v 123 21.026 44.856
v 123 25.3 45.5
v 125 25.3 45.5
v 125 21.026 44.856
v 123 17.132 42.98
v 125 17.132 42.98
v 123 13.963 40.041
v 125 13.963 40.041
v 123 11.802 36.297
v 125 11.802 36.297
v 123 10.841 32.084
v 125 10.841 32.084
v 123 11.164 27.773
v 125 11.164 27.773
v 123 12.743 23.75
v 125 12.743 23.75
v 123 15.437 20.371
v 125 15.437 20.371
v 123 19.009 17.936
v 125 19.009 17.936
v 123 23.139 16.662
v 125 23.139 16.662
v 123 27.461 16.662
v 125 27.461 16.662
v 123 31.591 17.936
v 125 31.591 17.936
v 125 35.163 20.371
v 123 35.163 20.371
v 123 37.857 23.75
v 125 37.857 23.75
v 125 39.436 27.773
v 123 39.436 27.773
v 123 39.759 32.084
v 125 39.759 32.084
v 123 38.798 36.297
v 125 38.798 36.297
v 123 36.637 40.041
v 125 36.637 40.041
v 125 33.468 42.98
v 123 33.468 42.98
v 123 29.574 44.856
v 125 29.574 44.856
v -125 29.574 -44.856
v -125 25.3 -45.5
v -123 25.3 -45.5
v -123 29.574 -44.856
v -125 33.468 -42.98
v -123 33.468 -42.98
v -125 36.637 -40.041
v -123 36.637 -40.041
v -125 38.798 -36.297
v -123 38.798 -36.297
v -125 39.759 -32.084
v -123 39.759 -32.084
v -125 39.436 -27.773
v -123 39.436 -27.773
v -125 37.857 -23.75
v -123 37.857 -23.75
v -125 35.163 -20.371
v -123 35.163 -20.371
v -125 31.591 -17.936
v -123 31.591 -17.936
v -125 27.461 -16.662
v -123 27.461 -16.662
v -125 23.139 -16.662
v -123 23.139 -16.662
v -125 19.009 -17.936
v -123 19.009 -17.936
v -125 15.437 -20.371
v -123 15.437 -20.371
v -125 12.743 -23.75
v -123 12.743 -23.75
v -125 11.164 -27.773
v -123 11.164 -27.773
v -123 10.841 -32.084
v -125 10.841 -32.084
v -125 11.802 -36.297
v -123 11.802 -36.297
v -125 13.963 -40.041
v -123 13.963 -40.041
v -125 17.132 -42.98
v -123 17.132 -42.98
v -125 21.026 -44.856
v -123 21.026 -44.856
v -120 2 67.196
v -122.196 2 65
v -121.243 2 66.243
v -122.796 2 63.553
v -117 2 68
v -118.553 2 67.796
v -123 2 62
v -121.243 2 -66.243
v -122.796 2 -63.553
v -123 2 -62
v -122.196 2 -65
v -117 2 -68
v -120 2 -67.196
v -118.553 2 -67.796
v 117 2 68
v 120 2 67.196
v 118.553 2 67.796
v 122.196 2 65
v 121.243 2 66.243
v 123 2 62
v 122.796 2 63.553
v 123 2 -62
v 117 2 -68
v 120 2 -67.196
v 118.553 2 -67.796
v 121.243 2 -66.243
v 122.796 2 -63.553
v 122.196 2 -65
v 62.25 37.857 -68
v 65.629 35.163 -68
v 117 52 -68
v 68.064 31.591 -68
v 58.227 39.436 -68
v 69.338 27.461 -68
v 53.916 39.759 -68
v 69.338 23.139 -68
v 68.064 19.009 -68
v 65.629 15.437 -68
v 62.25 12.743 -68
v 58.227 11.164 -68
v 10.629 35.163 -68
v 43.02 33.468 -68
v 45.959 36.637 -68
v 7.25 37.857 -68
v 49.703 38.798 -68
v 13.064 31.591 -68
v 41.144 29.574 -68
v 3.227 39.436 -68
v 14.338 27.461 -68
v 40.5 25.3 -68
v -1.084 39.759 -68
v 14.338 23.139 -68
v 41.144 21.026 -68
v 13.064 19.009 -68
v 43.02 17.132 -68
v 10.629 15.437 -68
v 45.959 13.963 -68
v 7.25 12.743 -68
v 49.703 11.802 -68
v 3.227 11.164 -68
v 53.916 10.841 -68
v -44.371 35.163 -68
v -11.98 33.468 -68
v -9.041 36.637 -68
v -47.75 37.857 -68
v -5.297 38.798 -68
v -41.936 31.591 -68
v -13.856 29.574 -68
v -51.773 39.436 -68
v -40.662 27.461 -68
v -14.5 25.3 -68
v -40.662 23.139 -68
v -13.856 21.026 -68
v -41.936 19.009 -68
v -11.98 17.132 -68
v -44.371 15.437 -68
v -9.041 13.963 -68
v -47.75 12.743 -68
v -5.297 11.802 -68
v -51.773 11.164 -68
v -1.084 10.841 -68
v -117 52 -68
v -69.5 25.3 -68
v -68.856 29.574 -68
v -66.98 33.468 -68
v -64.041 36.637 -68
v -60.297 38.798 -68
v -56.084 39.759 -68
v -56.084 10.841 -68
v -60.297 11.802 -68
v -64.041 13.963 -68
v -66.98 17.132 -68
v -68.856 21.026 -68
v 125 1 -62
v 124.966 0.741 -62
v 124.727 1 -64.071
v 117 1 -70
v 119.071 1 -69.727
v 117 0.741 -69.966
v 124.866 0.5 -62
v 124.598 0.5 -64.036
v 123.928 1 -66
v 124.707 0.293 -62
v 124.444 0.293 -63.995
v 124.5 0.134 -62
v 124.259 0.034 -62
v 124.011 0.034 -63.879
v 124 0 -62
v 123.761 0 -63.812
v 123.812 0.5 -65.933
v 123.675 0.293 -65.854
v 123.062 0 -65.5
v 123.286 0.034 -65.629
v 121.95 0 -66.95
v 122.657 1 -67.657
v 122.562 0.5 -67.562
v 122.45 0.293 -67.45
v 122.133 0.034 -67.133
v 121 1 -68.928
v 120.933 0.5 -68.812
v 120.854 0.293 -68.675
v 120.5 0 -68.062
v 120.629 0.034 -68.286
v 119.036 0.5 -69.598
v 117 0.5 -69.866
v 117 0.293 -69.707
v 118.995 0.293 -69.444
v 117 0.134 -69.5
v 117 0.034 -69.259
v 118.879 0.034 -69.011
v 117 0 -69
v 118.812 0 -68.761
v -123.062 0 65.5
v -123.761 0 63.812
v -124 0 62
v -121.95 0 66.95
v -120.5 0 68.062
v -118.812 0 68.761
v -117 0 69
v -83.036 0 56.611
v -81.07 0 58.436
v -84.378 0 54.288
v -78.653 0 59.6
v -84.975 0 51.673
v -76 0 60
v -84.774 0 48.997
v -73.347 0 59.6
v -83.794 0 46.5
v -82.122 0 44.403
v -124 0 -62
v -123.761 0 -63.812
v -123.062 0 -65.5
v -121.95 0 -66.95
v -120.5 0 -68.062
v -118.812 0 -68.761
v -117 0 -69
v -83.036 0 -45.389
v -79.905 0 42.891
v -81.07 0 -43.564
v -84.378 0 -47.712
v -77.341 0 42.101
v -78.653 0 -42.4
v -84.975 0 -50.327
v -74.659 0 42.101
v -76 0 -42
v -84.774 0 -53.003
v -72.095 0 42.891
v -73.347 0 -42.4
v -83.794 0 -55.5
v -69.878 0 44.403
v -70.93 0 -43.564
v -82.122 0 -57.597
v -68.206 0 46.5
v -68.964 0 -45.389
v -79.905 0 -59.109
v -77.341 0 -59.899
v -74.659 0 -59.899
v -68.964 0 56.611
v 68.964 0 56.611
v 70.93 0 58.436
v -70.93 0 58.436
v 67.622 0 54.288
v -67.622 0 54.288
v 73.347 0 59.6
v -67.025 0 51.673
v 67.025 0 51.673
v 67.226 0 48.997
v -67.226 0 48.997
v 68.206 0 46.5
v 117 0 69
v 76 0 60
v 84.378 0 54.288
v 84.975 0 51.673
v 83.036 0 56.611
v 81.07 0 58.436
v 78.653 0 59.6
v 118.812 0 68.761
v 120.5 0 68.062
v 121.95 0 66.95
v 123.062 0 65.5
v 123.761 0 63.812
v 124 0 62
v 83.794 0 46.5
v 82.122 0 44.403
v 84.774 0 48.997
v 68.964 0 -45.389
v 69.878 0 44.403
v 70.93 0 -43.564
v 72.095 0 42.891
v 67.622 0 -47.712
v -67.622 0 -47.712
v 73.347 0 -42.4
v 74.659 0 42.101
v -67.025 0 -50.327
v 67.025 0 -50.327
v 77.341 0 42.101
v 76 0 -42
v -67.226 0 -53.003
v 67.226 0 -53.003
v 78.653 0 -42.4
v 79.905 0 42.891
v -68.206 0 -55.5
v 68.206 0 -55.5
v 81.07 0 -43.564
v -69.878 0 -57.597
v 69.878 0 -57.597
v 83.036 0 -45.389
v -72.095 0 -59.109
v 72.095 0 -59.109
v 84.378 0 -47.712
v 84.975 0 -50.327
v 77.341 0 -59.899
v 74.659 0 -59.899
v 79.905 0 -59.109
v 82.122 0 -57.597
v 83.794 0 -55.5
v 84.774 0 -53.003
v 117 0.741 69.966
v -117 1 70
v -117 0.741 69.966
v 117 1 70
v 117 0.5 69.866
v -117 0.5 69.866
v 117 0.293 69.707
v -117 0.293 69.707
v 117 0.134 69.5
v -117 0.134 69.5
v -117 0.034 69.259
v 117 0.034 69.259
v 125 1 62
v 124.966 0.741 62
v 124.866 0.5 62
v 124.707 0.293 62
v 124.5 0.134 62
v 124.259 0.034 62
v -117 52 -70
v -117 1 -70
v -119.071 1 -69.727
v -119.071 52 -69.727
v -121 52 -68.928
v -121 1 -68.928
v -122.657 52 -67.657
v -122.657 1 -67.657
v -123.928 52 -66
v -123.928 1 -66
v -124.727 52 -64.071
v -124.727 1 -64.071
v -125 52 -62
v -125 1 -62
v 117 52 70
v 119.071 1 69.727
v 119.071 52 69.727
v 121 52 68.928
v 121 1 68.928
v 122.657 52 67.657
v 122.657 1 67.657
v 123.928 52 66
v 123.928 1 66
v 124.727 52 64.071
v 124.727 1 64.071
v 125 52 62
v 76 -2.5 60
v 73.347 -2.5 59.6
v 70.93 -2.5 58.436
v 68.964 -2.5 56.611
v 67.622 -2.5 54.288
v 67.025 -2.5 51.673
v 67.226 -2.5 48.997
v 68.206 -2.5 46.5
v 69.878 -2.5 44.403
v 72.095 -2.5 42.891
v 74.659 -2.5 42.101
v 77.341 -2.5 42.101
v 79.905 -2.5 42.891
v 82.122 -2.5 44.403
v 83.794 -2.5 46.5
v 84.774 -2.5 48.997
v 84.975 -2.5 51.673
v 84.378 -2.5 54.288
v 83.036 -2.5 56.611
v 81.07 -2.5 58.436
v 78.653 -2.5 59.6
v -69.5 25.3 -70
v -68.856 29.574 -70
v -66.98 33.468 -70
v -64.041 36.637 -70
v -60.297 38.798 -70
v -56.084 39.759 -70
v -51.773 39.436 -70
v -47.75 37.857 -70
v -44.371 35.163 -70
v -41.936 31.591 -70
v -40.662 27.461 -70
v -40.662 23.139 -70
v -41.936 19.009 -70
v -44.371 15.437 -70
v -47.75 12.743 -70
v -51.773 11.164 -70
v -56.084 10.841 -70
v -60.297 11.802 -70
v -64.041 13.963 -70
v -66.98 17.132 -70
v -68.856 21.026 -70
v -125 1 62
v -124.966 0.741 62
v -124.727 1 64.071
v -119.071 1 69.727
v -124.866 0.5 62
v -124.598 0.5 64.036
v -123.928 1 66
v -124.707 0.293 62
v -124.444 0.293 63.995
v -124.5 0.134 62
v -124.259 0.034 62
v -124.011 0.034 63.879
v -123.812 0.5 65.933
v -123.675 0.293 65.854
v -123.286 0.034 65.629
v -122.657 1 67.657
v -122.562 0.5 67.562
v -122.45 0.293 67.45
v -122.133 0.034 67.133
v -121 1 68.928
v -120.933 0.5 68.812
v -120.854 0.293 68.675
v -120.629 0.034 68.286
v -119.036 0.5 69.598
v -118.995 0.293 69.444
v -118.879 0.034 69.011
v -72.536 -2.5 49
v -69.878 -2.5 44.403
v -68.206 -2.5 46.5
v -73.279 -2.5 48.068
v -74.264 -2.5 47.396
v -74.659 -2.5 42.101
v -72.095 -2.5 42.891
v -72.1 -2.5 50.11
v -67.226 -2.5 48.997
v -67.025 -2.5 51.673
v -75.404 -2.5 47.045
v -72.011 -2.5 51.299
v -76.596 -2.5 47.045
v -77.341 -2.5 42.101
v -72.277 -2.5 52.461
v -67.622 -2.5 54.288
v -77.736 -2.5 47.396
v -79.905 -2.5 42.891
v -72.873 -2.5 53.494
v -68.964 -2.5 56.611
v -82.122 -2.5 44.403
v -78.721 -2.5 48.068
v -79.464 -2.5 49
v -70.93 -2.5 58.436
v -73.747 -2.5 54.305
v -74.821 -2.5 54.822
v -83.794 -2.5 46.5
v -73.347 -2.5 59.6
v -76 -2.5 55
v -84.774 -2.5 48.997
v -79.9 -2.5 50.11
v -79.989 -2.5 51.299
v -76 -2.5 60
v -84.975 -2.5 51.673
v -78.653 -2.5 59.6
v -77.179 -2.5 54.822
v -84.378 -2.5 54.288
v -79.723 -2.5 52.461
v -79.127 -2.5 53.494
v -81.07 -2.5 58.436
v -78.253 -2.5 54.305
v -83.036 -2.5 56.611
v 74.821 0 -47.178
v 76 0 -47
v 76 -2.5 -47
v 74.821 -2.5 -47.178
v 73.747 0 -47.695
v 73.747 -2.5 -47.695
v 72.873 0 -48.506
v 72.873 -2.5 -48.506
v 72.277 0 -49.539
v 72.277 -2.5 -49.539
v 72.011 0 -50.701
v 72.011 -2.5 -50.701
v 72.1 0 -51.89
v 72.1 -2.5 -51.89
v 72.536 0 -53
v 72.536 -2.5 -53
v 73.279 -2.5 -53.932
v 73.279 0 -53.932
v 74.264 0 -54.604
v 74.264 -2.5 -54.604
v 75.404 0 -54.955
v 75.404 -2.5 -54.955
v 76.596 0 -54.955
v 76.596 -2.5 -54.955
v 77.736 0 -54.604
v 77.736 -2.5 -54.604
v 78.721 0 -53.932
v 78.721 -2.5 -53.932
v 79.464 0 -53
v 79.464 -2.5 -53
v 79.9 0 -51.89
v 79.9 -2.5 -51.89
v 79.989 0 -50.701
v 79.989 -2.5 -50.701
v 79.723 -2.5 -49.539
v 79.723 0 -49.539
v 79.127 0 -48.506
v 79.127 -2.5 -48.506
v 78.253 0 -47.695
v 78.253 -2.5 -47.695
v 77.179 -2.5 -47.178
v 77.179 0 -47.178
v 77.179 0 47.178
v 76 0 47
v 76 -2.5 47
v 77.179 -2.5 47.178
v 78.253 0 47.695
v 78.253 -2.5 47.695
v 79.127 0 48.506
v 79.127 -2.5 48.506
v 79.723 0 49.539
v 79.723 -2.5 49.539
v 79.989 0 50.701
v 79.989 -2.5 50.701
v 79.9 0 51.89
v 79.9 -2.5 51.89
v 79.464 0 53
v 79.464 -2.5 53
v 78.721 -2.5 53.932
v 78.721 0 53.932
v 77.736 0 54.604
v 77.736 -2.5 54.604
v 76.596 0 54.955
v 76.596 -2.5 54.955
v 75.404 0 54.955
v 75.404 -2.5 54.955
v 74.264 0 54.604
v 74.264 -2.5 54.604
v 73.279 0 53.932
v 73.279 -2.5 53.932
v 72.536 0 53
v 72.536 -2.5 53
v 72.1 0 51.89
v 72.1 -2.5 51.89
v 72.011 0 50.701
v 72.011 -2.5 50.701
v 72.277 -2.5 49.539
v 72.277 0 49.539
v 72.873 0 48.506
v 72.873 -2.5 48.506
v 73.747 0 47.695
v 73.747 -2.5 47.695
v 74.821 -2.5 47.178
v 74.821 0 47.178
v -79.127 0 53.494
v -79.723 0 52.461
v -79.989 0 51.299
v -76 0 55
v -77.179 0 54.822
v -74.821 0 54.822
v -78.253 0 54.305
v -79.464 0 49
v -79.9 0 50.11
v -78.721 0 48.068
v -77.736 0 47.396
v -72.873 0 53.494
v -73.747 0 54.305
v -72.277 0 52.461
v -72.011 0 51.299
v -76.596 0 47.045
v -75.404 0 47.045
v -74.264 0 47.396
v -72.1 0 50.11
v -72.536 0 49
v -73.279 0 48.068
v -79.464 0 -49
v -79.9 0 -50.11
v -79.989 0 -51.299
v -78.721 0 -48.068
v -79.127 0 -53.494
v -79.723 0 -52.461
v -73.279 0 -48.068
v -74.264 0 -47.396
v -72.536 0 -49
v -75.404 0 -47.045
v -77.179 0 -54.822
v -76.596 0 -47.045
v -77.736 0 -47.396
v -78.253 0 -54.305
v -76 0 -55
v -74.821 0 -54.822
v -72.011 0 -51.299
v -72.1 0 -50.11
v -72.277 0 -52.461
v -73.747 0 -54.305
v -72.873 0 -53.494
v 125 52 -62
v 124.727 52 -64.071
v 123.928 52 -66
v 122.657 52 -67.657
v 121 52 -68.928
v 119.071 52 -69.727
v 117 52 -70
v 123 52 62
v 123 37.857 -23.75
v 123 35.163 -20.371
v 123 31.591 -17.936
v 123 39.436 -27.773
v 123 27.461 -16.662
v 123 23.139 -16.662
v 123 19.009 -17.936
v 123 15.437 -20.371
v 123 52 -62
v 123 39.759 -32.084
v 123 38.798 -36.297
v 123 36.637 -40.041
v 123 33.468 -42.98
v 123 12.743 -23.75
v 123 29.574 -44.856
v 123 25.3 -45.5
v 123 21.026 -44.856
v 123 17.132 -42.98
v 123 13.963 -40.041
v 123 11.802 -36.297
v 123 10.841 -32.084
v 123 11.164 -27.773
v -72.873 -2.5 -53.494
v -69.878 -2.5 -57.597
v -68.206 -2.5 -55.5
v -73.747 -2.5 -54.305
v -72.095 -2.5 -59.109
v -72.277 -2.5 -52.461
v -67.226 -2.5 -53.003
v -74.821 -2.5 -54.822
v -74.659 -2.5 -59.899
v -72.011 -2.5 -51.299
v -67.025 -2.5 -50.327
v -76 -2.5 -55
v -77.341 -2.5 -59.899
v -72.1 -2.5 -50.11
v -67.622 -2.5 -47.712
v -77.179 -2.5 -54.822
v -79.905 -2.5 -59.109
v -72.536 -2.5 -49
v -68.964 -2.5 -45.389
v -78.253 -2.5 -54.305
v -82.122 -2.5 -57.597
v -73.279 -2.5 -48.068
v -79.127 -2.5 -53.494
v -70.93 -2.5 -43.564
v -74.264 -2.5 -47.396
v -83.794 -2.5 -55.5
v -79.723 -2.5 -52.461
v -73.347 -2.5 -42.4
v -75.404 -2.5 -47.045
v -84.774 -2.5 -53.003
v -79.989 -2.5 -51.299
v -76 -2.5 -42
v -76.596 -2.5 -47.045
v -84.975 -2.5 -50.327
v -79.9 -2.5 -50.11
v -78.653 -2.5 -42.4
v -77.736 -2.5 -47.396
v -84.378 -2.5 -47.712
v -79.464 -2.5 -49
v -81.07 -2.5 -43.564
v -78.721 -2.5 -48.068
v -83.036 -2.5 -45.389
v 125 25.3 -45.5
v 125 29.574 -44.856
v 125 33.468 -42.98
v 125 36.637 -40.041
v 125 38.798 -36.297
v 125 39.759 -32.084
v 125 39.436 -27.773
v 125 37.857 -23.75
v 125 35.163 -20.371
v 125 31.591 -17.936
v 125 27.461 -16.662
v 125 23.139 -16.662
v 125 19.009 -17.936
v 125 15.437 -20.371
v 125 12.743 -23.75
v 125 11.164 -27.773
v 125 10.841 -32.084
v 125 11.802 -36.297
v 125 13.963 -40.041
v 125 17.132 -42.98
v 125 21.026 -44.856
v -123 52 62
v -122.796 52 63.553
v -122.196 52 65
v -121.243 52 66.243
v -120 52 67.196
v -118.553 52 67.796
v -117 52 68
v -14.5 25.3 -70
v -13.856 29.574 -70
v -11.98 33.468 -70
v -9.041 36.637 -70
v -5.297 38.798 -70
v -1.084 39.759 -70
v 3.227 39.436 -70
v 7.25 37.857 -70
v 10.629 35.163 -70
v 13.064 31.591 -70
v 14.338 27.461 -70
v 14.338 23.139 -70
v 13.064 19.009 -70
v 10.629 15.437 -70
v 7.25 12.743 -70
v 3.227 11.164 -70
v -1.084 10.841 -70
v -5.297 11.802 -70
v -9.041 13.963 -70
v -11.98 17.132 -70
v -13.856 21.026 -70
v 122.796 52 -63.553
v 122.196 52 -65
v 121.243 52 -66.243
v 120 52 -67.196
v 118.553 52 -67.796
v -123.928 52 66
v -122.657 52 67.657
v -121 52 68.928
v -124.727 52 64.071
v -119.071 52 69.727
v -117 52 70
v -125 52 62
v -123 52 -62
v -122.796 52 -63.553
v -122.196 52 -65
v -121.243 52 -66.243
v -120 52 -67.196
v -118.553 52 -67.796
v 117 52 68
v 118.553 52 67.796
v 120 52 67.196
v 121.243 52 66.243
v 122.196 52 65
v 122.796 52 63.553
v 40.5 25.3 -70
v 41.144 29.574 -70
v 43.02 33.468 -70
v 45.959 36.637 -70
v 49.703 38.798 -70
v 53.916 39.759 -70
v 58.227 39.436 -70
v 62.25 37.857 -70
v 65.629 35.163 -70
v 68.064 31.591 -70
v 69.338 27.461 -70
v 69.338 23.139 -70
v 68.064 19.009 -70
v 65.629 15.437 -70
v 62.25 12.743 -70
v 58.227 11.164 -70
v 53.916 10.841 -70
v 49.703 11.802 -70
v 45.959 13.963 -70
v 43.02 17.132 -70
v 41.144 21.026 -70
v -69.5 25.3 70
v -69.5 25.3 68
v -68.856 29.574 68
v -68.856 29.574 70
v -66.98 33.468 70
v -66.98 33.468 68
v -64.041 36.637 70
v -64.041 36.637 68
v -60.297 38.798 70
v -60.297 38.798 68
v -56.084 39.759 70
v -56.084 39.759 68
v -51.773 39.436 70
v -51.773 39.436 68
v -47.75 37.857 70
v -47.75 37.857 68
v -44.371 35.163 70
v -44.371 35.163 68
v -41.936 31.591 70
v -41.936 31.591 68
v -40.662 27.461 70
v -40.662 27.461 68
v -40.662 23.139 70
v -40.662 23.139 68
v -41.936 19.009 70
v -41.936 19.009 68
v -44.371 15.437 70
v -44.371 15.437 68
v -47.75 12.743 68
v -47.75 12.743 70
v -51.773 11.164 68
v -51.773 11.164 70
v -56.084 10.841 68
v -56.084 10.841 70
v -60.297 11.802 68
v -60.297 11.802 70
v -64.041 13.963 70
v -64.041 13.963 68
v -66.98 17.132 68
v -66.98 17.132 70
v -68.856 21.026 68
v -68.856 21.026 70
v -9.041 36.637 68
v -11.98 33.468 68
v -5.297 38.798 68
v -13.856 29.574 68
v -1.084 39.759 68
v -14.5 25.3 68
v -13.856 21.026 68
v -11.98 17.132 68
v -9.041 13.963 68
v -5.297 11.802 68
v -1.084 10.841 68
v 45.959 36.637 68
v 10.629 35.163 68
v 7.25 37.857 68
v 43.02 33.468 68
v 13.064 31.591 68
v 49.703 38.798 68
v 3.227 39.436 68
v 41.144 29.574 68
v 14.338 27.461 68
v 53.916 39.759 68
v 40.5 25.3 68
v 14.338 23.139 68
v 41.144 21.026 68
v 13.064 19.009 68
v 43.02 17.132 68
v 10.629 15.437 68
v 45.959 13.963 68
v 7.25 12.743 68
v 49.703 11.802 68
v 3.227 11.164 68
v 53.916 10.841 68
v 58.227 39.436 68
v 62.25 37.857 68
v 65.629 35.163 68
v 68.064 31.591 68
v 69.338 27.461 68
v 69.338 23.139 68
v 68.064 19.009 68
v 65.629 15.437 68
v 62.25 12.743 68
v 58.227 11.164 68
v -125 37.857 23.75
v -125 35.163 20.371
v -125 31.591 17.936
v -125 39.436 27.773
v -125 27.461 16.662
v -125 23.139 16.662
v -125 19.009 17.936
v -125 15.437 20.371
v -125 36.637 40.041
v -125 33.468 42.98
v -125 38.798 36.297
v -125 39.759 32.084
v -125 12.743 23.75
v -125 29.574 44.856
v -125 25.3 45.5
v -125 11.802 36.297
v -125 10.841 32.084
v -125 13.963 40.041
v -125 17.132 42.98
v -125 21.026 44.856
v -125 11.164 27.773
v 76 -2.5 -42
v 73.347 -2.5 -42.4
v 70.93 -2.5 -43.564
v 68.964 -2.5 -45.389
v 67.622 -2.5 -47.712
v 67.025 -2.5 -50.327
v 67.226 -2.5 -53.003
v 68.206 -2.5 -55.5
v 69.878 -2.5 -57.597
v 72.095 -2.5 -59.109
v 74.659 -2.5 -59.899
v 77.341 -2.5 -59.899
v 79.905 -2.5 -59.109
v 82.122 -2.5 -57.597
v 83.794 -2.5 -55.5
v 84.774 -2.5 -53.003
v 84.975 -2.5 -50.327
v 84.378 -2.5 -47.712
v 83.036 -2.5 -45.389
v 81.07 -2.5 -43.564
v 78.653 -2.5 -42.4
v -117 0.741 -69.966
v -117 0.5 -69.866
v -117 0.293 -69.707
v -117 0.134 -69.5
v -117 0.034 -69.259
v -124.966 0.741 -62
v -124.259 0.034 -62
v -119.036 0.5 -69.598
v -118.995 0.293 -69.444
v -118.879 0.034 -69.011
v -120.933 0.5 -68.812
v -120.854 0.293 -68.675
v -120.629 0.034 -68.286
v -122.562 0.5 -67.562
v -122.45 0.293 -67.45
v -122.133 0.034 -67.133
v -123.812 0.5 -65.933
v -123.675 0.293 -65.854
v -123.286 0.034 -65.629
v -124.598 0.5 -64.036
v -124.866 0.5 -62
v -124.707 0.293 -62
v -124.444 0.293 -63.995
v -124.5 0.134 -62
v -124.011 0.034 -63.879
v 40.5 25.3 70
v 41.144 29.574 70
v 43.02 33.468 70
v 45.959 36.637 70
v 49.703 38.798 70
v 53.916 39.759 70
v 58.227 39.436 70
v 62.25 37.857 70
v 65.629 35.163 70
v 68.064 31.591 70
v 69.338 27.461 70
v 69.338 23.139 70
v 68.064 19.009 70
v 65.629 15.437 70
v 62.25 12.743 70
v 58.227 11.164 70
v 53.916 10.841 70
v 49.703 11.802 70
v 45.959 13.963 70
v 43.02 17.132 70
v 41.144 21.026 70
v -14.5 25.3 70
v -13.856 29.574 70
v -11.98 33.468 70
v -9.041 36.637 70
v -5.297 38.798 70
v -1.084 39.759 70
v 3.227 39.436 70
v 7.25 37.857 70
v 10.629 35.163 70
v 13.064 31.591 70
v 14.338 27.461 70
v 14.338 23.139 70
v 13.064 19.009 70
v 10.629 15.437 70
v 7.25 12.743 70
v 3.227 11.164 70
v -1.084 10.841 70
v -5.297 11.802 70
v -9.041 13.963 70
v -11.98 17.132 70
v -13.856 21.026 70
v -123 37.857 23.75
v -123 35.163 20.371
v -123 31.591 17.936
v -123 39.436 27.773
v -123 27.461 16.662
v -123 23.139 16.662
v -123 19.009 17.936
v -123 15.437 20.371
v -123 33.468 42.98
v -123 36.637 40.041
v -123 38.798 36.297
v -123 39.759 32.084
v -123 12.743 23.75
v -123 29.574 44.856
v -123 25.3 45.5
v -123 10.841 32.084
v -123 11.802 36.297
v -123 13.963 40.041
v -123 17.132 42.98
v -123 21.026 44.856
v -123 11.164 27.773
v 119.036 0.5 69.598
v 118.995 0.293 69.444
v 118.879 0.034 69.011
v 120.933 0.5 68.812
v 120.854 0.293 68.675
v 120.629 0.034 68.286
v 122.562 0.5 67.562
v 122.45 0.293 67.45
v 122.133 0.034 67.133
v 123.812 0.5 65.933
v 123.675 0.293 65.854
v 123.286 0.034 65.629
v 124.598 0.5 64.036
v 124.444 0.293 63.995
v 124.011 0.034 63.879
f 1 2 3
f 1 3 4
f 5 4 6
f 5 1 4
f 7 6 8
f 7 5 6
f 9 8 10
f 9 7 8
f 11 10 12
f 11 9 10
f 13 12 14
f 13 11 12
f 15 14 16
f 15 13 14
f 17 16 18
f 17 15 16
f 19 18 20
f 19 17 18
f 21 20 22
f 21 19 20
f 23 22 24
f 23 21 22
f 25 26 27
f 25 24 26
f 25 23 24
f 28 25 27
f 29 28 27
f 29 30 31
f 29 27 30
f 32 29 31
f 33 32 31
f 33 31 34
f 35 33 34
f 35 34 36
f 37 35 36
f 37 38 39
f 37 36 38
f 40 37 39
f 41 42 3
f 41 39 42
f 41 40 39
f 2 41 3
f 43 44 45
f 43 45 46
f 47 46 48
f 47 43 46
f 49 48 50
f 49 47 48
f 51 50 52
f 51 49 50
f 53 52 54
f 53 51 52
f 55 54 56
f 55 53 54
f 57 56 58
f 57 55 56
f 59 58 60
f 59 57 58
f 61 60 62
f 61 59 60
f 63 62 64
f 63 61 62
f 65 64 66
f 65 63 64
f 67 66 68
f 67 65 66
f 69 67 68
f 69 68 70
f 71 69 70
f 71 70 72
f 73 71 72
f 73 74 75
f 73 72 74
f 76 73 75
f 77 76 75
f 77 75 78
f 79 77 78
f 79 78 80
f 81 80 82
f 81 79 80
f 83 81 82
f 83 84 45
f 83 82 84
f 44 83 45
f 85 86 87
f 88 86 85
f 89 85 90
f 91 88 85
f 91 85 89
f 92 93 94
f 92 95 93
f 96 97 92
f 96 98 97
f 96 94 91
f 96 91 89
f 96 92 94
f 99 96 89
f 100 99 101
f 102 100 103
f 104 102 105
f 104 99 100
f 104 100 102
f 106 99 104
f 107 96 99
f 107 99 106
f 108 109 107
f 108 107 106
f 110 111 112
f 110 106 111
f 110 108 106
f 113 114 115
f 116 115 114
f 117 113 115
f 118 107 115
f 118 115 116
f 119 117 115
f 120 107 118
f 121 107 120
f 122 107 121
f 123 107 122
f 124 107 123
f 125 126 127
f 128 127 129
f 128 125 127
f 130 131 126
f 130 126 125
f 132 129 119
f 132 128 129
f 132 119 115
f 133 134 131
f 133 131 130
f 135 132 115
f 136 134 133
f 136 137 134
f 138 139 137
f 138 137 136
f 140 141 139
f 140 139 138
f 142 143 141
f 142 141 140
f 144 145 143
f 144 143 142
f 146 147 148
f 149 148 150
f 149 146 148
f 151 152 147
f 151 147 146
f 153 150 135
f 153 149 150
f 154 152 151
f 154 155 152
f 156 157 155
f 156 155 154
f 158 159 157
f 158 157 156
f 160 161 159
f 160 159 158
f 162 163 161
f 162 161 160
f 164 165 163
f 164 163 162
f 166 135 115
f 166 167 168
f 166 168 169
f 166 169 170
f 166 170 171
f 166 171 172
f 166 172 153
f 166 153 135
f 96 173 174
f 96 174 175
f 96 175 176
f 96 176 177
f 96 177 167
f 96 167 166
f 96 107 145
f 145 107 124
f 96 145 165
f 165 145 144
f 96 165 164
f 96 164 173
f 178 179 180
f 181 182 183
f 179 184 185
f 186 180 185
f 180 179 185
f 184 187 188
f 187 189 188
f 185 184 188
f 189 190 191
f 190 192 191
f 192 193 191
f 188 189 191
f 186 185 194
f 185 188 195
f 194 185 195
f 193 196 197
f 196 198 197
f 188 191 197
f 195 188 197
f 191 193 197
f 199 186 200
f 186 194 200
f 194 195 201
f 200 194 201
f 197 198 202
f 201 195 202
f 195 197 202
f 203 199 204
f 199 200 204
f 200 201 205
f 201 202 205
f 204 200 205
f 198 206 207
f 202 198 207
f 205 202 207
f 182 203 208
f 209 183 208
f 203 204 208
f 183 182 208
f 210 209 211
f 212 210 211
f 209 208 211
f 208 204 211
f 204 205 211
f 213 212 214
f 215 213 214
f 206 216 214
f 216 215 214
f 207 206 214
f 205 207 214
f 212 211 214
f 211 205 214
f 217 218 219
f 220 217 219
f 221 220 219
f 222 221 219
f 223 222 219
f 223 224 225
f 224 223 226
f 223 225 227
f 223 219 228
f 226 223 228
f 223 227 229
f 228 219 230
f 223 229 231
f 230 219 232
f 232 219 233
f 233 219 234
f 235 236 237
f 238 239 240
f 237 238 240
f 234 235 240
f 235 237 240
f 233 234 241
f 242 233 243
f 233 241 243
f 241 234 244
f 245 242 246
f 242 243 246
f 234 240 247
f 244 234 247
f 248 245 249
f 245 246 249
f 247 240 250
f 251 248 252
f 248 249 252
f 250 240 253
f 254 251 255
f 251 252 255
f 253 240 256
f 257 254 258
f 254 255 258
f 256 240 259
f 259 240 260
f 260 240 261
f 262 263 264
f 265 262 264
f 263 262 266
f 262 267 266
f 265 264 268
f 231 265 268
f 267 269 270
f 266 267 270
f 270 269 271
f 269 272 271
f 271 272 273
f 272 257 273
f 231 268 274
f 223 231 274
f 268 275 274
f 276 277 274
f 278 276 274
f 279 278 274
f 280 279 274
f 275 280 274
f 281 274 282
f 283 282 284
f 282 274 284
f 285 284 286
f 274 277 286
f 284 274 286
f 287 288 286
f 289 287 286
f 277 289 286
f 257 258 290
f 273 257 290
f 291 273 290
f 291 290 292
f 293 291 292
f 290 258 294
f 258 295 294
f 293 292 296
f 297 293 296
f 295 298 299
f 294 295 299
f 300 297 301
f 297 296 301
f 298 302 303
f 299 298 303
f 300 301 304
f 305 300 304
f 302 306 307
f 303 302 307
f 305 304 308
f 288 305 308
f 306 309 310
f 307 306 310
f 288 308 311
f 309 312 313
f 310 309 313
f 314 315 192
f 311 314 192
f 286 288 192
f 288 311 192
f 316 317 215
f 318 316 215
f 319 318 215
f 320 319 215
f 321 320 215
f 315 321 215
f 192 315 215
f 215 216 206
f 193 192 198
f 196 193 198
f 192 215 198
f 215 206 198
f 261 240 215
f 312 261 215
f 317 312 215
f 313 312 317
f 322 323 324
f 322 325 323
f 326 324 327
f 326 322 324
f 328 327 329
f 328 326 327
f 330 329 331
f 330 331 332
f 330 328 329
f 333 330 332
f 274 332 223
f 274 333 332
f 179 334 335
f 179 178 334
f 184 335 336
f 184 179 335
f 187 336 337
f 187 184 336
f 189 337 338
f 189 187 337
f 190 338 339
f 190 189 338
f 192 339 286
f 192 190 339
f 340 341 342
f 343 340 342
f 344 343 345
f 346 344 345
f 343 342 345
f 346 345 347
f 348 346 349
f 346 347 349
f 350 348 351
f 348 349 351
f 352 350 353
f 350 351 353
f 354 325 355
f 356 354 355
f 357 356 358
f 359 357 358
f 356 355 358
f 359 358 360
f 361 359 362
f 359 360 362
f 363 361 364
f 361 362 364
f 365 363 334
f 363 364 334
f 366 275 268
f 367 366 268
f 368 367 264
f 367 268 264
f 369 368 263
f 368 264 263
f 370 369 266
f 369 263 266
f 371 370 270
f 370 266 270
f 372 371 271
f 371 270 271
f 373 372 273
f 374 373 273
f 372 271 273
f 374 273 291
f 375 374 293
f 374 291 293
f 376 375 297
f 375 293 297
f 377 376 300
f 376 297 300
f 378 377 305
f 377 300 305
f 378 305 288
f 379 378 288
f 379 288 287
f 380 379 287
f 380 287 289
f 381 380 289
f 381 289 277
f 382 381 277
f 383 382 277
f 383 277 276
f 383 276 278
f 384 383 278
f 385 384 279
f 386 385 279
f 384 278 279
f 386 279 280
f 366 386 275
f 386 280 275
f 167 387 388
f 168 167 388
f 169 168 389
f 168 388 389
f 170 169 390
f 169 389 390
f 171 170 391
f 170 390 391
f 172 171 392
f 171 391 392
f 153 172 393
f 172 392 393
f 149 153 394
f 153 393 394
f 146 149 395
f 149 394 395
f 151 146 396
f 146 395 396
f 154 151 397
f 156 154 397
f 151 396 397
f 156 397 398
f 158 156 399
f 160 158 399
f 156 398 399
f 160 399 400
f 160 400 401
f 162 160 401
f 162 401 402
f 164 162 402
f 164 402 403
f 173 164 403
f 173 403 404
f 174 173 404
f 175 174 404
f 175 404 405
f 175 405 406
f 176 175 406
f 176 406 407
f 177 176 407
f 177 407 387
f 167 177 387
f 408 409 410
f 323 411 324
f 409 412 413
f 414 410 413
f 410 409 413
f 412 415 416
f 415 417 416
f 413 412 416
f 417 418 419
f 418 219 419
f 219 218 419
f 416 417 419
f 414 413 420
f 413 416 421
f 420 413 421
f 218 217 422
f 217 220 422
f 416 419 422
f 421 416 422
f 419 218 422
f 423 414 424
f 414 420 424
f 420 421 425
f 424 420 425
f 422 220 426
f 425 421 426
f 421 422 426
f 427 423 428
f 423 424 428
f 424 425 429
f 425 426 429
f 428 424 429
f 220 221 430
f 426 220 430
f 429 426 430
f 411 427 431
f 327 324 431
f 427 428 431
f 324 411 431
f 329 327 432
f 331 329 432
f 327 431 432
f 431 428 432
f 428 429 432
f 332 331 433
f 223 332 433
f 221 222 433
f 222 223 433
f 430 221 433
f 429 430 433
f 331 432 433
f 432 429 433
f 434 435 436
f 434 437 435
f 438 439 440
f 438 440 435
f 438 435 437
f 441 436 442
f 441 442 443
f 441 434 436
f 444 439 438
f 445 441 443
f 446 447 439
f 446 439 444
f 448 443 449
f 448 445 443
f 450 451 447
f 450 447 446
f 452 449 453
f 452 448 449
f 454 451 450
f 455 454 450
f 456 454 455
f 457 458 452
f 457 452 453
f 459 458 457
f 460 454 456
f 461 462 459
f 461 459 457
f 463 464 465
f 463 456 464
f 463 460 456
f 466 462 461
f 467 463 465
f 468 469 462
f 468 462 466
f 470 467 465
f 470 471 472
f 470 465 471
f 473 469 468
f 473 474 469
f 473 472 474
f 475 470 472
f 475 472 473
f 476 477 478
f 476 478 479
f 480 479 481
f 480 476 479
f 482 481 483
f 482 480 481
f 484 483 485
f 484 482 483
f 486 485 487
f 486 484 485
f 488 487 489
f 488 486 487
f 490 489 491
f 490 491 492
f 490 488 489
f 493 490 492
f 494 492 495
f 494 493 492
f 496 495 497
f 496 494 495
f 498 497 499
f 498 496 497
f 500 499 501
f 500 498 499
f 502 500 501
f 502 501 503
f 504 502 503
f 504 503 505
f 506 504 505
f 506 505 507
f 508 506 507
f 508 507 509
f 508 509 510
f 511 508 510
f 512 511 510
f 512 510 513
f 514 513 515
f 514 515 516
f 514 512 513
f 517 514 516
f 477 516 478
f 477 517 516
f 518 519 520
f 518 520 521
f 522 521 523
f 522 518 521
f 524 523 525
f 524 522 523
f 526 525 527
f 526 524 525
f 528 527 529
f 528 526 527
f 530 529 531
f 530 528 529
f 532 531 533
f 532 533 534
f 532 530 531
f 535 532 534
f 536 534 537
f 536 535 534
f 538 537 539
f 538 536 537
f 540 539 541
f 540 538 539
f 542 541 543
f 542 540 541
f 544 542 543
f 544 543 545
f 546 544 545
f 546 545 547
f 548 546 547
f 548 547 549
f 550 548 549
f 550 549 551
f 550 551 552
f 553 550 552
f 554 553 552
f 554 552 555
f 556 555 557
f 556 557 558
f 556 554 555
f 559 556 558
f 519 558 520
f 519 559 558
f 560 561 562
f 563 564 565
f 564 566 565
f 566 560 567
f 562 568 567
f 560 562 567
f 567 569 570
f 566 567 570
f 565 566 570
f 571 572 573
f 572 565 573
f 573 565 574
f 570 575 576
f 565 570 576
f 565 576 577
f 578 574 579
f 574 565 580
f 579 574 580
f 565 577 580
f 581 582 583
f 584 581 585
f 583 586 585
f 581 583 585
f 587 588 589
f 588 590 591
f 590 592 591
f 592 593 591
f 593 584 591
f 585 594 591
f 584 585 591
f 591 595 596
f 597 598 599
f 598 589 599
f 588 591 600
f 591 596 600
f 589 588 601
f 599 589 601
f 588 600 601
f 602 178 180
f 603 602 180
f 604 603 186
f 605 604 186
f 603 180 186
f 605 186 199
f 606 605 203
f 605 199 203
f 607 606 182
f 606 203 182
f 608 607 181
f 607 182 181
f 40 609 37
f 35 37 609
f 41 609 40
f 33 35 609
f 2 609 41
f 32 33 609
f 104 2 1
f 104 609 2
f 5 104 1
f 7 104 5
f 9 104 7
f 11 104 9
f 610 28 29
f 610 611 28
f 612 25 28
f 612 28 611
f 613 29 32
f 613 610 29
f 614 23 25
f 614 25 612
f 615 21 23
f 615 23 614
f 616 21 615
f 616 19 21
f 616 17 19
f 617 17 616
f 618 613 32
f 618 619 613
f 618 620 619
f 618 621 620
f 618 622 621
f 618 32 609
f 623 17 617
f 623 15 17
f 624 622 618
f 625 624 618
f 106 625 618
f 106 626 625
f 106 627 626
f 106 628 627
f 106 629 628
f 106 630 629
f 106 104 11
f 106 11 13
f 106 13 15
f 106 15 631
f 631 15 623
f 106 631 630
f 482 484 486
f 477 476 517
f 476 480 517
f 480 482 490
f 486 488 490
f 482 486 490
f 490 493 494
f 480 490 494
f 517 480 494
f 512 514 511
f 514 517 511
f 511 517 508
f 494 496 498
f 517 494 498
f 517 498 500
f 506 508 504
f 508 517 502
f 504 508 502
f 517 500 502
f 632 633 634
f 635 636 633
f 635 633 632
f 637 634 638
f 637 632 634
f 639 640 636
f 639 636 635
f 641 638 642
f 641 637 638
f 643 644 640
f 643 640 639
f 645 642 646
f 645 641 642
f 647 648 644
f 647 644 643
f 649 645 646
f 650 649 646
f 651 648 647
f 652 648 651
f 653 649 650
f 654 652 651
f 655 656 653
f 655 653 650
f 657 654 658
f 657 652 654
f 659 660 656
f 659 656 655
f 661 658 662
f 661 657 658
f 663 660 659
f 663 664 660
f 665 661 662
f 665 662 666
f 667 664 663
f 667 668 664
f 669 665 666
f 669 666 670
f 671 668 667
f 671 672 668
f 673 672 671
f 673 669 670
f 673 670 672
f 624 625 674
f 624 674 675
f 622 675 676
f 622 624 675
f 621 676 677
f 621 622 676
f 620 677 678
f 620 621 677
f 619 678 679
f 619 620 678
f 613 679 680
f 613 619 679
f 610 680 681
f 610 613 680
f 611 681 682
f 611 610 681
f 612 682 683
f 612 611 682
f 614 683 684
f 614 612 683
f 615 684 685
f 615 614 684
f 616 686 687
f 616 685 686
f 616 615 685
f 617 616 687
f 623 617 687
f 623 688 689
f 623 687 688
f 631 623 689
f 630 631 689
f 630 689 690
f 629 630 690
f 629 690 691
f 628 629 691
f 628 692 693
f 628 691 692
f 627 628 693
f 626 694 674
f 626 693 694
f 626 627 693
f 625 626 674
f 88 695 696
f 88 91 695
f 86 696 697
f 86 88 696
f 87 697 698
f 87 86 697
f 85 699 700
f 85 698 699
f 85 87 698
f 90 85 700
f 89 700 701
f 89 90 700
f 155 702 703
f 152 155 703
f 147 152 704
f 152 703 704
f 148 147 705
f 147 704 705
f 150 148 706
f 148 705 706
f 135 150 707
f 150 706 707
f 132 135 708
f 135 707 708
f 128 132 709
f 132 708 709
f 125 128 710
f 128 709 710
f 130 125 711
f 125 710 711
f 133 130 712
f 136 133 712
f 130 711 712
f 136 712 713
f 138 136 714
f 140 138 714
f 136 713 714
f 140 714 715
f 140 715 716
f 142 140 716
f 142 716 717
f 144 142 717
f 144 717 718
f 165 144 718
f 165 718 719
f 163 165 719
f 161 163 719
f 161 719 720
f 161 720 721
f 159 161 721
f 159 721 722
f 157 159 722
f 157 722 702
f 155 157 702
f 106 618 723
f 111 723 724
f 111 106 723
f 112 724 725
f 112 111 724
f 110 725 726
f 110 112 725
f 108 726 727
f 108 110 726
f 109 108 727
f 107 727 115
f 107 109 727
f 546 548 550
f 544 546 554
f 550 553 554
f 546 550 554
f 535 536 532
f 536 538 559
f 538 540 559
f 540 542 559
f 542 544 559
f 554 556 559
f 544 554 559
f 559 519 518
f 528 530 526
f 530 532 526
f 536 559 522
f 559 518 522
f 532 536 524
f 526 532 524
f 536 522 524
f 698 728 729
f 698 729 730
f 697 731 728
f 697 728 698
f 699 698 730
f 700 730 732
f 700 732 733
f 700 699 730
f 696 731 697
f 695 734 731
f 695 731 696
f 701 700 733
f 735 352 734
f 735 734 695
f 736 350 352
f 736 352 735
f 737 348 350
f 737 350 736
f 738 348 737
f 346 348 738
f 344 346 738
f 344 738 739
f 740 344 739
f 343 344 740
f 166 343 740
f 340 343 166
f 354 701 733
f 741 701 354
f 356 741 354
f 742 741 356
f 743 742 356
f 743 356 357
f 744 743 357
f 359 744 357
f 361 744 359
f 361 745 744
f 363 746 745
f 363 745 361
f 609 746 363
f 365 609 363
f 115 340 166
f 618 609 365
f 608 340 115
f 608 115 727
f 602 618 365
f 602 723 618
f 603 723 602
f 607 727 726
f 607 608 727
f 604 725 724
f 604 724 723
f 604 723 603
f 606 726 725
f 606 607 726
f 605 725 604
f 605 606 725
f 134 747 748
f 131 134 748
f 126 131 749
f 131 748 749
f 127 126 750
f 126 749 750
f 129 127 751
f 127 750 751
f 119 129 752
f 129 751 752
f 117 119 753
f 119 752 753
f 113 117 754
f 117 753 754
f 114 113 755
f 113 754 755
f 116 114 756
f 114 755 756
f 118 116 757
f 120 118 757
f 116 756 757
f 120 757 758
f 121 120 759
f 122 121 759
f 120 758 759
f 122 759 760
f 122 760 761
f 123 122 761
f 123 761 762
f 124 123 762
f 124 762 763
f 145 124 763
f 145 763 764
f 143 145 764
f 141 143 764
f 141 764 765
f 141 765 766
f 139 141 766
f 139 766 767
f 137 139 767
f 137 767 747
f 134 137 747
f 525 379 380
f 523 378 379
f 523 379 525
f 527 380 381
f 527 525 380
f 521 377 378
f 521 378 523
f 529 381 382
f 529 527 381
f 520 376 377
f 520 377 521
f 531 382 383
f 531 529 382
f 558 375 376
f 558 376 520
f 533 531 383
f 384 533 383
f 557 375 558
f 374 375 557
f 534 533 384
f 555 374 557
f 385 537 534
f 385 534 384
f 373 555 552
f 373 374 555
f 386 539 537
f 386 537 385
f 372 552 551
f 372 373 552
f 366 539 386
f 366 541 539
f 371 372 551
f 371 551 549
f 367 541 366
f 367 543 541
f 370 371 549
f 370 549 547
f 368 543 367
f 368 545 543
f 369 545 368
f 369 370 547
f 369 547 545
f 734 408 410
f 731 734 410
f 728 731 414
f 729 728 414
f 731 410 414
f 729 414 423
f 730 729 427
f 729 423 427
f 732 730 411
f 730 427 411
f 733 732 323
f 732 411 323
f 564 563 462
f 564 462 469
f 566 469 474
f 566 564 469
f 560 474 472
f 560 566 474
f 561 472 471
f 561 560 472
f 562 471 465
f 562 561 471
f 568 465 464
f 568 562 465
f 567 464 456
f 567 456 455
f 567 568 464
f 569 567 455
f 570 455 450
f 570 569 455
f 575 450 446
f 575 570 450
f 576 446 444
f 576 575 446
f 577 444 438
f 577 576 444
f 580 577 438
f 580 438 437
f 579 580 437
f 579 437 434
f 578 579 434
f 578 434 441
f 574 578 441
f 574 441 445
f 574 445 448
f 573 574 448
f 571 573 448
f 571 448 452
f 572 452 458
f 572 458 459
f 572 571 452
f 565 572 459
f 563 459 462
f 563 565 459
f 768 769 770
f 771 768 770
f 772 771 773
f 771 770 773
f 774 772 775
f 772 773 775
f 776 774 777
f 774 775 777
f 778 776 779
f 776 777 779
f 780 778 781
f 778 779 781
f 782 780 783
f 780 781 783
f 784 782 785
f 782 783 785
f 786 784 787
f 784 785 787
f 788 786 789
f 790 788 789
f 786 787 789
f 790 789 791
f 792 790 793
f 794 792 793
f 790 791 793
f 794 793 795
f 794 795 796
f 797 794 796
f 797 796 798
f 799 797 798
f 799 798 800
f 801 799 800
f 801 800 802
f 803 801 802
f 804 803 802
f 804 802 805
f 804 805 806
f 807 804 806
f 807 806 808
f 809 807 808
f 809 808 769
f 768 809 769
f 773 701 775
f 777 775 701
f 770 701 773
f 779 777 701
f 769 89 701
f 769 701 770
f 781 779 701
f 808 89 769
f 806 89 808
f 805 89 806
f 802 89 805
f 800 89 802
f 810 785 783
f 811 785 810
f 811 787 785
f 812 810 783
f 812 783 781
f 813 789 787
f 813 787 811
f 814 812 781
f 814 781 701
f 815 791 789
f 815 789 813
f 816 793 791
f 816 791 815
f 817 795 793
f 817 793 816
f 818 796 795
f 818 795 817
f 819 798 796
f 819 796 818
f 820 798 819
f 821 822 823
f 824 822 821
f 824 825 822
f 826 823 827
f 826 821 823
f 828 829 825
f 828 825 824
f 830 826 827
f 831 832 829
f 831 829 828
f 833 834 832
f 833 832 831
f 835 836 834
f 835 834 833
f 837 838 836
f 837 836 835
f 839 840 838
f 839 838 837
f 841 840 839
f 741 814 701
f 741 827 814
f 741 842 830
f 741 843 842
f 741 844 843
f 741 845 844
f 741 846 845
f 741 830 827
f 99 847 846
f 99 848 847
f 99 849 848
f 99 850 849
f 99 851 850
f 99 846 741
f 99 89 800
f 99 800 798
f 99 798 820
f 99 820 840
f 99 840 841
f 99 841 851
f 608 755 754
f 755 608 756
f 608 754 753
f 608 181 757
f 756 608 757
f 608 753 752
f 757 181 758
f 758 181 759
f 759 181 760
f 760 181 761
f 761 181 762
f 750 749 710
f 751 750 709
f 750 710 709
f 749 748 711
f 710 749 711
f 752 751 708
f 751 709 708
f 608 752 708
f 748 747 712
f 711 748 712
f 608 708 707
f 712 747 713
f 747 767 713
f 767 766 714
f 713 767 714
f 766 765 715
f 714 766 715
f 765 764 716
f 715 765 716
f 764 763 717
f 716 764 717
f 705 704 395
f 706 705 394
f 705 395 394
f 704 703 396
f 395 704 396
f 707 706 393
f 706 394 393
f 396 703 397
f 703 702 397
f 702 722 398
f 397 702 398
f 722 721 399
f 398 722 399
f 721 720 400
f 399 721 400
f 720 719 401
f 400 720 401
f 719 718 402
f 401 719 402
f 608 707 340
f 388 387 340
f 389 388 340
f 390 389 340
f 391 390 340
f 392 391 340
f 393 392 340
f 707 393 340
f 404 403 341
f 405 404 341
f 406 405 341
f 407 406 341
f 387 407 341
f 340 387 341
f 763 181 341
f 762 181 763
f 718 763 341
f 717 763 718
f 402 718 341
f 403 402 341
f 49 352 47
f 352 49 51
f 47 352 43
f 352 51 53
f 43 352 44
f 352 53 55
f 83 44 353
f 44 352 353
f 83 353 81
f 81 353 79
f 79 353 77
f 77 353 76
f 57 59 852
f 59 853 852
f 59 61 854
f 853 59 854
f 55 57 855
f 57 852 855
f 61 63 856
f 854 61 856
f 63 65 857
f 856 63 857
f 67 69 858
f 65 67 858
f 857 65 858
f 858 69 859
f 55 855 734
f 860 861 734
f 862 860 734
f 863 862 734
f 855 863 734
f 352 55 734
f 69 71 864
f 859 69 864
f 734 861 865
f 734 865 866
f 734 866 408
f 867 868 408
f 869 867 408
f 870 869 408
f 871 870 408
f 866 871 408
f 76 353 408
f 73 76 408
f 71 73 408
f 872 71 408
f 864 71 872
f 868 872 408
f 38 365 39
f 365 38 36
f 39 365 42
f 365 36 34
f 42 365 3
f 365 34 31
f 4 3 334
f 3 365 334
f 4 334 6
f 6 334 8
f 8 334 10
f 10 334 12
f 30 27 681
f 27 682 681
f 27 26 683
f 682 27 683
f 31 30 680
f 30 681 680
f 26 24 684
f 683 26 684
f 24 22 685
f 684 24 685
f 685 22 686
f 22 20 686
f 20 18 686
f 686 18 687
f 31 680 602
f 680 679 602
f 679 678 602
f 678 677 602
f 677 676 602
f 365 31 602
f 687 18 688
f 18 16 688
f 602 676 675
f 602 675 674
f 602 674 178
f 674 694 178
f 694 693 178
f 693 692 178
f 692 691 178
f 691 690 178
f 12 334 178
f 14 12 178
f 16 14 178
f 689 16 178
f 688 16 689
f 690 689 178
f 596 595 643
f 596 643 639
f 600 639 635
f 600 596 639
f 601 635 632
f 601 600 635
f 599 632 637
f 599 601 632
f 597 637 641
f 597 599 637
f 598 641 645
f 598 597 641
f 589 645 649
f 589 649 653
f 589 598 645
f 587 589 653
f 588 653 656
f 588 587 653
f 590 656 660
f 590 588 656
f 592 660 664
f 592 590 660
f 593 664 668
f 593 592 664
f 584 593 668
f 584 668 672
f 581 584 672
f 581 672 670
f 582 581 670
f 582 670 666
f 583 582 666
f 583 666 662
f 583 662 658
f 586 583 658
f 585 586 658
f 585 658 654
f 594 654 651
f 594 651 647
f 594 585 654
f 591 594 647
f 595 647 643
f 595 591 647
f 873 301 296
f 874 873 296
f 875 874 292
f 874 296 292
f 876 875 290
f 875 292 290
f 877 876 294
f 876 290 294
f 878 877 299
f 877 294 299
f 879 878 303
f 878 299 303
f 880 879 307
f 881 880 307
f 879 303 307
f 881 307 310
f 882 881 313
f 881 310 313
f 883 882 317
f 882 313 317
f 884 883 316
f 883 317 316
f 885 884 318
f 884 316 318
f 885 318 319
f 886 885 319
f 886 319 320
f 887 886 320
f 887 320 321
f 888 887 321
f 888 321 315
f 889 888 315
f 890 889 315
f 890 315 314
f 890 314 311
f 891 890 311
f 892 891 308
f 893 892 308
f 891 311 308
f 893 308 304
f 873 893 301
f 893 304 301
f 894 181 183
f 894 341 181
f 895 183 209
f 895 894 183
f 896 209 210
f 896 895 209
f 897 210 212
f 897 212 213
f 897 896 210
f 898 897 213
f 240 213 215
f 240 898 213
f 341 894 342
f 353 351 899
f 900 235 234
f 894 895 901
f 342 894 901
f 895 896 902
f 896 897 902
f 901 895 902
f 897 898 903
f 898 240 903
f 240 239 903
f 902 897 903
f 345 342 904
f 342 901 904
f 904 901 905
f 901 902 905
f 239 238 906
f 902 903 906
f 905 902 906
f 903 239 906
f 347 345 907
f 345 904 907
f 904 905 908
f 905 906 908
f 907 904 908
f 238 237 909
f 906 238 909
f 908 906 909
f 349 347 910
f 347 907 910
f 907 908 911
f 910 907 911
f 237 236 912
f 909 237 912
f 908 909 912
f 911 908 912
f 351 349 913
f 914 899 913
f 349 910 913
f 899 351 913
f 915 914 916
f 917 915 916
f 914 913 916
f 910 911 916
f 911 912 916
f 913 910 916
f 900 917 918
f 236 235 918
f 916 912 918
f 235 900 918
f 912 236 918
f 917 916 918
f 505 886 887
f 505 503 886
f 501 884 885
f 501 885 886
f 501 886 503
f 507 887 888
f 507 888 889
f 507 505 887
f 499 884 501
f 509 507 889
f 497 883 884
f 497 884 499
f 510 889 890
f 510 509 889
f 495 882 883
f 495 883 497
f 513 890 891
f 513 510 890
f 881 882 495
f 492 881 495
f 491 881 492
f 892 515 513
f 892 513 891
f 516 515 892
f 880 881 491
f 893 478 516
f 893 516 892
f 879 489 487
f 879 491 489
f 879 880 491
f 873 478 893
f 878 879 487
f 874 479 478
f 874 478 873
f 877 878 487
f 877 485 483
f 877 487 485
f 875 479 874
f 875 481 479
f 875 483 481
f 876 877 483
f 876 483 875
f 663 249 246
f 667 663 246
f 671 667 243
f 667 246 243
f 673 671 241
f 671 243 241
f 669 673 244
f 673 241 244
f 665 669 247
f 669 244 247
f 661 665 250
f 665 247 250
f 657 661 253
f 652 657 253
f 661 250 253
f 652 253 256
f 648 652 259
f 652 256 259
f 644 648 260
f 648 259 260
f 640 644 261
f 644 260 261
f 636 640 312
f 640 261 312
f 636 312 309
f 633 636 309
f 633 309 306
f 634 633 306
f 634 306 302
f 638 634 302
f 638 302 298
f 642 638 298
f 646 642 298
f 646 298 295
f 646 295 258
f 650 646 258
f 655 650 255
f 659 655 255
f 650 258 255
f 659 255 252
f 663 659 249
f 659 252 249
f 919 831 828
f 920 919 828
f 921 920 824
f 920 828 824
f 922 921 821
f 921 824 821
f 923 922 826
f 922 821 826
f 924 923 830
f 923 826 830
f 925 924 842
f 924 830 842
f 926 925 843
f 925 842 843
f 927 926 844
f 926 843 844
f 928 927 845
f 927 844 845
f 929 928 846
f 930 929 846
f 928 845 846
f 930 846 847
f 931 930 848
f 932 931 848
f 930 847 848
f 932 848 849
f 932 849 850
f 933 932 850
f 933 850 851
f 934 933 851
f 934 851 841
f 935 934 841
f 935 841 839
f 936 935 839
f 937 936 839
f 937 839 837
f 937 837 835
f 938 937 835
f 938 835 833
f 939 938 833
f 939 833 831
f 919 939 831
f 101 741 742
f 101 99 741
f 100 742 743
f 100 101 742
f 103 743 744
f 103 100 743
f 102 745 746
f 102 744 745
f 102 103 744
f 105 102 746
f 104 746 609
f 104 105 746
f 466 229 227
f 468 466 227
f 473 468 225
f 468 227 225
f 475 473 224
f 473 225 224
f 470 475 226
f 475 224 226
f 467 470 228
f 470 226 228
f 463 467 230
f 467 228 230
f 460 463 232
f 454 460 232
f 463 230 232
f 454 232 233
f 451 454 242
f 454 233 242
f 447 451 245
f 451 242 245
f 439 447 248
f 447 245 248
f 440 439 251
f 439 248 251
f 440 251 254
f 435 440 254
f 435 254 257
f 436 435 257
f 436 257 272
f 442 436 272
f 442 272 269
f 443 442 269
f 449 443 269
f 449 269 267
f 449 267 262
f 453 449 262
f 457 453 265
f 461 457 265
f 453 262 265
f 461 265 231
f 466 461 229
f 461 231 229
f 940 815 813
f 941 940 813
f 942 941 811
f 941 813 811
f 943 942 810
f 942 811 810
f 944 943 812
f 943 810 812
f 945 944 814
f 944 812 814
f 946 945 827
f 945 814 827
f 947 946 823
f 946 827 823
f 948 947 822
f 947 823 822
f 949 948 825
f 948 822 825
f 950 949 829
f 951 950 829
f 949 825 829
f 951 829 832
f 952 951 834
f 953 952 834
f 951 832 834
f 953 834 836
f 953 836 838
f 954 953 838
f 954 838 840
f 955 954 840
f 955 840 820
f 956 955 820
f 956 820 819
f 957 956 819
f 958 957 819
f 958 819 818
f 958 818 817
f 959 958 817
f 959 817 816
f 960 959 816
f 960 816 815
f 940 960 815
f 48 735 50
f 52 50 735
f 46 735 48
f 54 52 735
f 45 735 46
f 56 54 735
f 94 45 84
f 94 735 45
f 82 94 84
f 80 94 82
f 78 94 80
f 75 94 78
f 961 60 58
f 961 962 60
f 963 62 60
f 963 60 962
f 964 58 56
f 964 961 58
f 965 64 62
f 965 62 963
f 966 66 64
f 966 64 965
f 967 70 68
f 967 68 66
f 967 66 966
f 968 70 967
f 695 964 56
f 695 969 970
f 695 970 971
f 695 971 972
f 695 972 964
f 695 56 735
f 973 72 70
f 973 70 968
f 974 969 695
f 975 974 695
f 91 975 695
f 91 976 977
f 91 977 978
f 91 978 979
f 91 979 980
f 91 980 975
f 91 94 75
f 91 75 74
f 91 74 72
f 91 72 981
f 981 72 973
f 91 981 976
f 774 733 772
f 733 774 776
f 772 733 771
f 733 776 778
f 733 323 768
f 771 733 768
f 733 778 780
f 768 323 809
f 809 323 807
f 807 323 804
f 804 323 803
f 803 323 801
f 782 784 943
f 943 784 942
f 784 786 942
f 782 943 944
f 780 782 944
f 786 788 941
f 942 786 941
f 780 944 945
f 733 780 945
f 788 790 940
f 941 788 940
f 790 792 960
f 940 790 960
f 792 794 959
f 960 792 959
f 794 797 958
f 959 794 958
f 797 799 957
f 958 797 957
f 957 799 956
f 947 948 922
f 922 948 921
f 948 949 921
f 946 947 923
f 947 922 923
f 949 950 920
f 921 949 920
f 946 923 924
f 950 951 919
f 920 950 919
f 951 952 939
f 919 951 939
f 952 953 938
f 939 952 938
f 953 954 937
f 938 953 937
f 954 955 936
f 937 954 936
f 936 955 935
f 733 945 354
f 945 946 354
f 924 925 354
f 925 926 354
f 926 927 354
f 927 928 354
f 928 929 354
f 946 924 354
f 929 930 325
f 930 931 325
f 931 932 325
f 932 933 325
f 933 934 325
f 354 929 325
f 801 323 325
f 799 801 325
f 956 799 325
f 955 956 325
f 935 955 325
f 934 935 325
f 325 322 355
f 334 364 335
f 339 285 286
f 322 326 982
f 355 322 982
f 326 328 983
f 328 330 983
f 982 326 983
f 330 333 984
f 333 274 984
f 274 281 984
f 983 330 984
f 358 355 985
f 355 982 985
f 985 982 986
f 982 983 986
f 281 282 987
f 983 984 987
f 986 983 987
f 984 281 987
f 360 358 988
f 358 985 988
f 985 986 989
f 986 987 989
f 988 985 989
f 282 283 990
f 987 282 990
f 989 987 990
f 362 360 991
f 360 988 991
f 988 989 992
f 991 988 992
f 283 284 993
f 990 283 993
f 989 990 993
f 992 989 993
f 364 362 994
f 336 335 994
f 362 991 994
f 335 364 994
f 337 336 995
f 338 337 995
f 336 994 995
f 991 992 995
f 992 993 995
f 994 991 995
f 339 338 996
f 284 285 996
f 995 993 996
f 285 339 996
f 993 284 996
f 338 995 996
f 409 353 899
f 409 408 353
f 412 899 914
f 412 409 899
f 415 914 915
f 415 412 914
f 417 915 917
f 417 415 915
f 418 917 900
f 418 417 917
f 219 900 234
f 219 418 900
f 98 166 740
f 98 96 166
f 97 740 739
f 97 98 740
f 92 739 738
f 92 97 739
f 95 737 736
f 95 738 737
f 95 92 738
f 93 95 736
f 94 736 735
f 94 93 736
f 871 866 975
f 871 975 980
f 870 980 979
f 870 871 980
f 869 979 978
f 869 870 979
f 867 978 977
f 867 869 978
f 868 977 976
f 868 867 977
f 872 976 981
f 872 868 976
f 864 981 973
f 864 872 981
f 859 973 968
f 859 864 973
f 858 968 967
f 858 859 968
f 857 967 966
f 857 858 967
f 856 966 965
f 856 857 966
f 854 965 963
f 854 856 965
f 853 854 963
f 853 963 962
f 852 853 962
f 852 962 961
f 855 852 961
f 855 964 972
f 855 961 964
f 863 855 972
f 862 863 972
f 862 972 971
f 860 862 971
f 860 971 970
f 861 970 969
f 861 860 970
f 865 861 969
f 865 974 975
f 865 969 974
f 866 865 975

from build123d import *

# Parameters (mm, degrees)
BOSS_EXTRUDE1_DEPTH     = 52
FILLET1_R               = 1
SHELL1_T                = -2
SKETCH2_R               = 9
SKETCH2_R_2             = 4
BOSS_EXTRUDE2_DEPTH     = 2.5
SKETCH3_R               = 14.5
CUT_EXTRUDE1_DEPTH      = 195.753690594
CUT_EXTRUDE2_DEPTH      = 153.410629551
CUT_EXTRUDE2_DEPTH_BACK = 153.410629551
SKETCH4_R               = 14.5


with BuildPart() as part:
    # Sketch1 → Boss-Extrude1 (new body)
    with BuildSketch(Plane(origin=(0, 0, 0), x_dir=(1, 0, 0), z_dir=(0, 1, 0))):
        with BuildLine():
            Line((125, -62), (125, 62))
            ThreePointArc((125, 62), (122.656854249, 67.656854249), (117, 70))
            Line((117, 70), (-117, 70))
            ThreePointArc((-117, 70), (-122.656854249, 67.656854249), (-125, 62))
            Line((-125, 62), (-125, -62))
            ThreePointArc((-125, -62), (-122.656854249, -67.656854249), (-117, -70))
            Line((-117, -70), (117, -70))
            ThreePointArc((117, -70), (122.656854249, -67.656854249), (125, -62))
        make_face()
    extrude(amount=BOSS_EXTRUDE1_DEPTH)

    # Fillet1
    fillet1_edges = [part.edges().sort_by_distance(p)[0] for p in [
        (0, 0, -70),
        (122.656854249, 0, -67.656854249),
        (125, 0, 0),
        (122.656854249, 0, 67.656854249),
        (0, 0, 70),
        (-122.656854249, 0, 67.656854249),
        (-125, 0, 0),
        (-122.656854249, 0, -67.656854249),
    ]]
    fillet(fillet1_edges, radius=FILLET1_R)

    # Shell1
    shell1_openings = [part.faces().sort_by_distance(p)[0] for p in [
        (0, 52, 0),
    ]]
    offset(amount=SHELL1_T, openings=shell1_openings, kind=Kind.INTERSECTION)

    # Sketch2 → Boss-Extrude2 (add)
    # profile 1 of 4: a face of its own
    with BuildSketch(Plane.XZ):
        with Locations(Location((76, 51, 0), (0, 0, 90))):
            Circle(SKETCH2_R)
        with Locations(Location((76, 51, 0), (0, 0, 270))):
            Circle(SKETCH2_R_2, mode=Mode.SUBTRACT)
    # profile 2 of 4: a face of its own
    with BuildSketch(Plane.XZ):
        with Locations(Location((76, -51, 0), (0, 0, 90))):
            Circle(SKETCH2_R)
        with Locations(Location((76, -51, 0), (0, 0, 90))):
            Circle(SKETCH2_R_2, mode=Mode.SUBTRACT)
    # profile 3 of 4: a face of its own
    with BuildSketch(Plane.XZ):
        with Locations(Location((-76, -51, 0), (0, 0, 90))):
            Circle(SKETCH2_R)
        with Locations(Location((-76, -51, 0), (0, 0, 270))):
            Circle(SKETCH2_R_2, mode=Mode.SUBTRACT)
    # profile 4 of 4: a face of its own
    with BuildSketch(Plane.XZ):
        with Locations(Location((-76, 51, 0), (0, 0, 90))):
            Circle(SKETCH2_R)
        with Locations(Location((-76, 51, 0), (0, 0, 90))):
            Circle(SKETCH2_R_2, mode=Mode.SUBTRACT)
    extrude(amount=BOSS_EXTRUDE2_DEPTH)

    # Sketch3 → Cut-Extrude1 (cut, through all)
    with BuildSketch(Plane(origin=(0, 0, -70), x_dir=(-1, 0, 0), z_dir=(0, 0, -1))):
        with Locations((-55, 25.3)):
            Circle(SKETCH3_R)
        with Locations((0, 25.3)):
            Circle(SKETCH3_R)
        with Locations((55, 25.3)):
            Circle(SKETCH3_R)
    extrude(amount=-CUT_EXTRUDE1_DEPTH, mode=Mode.SUBTRACT)

    # Sketch4 → Cut-Extrude2 (cut, two sides: drawn at the far end of the back side and taken through both)
    with BuildSketch(Plane(origin=(0, 0, 0), x_dir=(0, 0, -1), z_dir=(1, 0, 0)).offset(-CUT_EXTRUDE2_DEPTH_BACK)):
        with Locations((31, 25.3)):
            Circle(SKETCH4_R)
        with Locations(Location((-31, 25.3, 0), (0, 0, 180))):
            Circle(SKETCH4_R)
    extrude(amount=CUT_EXTRUDE2_DEPTH + CUT_EXTRUDE2_DEPTH_BACK, mode=Mode.SUBTRACT)


solid = part.part
